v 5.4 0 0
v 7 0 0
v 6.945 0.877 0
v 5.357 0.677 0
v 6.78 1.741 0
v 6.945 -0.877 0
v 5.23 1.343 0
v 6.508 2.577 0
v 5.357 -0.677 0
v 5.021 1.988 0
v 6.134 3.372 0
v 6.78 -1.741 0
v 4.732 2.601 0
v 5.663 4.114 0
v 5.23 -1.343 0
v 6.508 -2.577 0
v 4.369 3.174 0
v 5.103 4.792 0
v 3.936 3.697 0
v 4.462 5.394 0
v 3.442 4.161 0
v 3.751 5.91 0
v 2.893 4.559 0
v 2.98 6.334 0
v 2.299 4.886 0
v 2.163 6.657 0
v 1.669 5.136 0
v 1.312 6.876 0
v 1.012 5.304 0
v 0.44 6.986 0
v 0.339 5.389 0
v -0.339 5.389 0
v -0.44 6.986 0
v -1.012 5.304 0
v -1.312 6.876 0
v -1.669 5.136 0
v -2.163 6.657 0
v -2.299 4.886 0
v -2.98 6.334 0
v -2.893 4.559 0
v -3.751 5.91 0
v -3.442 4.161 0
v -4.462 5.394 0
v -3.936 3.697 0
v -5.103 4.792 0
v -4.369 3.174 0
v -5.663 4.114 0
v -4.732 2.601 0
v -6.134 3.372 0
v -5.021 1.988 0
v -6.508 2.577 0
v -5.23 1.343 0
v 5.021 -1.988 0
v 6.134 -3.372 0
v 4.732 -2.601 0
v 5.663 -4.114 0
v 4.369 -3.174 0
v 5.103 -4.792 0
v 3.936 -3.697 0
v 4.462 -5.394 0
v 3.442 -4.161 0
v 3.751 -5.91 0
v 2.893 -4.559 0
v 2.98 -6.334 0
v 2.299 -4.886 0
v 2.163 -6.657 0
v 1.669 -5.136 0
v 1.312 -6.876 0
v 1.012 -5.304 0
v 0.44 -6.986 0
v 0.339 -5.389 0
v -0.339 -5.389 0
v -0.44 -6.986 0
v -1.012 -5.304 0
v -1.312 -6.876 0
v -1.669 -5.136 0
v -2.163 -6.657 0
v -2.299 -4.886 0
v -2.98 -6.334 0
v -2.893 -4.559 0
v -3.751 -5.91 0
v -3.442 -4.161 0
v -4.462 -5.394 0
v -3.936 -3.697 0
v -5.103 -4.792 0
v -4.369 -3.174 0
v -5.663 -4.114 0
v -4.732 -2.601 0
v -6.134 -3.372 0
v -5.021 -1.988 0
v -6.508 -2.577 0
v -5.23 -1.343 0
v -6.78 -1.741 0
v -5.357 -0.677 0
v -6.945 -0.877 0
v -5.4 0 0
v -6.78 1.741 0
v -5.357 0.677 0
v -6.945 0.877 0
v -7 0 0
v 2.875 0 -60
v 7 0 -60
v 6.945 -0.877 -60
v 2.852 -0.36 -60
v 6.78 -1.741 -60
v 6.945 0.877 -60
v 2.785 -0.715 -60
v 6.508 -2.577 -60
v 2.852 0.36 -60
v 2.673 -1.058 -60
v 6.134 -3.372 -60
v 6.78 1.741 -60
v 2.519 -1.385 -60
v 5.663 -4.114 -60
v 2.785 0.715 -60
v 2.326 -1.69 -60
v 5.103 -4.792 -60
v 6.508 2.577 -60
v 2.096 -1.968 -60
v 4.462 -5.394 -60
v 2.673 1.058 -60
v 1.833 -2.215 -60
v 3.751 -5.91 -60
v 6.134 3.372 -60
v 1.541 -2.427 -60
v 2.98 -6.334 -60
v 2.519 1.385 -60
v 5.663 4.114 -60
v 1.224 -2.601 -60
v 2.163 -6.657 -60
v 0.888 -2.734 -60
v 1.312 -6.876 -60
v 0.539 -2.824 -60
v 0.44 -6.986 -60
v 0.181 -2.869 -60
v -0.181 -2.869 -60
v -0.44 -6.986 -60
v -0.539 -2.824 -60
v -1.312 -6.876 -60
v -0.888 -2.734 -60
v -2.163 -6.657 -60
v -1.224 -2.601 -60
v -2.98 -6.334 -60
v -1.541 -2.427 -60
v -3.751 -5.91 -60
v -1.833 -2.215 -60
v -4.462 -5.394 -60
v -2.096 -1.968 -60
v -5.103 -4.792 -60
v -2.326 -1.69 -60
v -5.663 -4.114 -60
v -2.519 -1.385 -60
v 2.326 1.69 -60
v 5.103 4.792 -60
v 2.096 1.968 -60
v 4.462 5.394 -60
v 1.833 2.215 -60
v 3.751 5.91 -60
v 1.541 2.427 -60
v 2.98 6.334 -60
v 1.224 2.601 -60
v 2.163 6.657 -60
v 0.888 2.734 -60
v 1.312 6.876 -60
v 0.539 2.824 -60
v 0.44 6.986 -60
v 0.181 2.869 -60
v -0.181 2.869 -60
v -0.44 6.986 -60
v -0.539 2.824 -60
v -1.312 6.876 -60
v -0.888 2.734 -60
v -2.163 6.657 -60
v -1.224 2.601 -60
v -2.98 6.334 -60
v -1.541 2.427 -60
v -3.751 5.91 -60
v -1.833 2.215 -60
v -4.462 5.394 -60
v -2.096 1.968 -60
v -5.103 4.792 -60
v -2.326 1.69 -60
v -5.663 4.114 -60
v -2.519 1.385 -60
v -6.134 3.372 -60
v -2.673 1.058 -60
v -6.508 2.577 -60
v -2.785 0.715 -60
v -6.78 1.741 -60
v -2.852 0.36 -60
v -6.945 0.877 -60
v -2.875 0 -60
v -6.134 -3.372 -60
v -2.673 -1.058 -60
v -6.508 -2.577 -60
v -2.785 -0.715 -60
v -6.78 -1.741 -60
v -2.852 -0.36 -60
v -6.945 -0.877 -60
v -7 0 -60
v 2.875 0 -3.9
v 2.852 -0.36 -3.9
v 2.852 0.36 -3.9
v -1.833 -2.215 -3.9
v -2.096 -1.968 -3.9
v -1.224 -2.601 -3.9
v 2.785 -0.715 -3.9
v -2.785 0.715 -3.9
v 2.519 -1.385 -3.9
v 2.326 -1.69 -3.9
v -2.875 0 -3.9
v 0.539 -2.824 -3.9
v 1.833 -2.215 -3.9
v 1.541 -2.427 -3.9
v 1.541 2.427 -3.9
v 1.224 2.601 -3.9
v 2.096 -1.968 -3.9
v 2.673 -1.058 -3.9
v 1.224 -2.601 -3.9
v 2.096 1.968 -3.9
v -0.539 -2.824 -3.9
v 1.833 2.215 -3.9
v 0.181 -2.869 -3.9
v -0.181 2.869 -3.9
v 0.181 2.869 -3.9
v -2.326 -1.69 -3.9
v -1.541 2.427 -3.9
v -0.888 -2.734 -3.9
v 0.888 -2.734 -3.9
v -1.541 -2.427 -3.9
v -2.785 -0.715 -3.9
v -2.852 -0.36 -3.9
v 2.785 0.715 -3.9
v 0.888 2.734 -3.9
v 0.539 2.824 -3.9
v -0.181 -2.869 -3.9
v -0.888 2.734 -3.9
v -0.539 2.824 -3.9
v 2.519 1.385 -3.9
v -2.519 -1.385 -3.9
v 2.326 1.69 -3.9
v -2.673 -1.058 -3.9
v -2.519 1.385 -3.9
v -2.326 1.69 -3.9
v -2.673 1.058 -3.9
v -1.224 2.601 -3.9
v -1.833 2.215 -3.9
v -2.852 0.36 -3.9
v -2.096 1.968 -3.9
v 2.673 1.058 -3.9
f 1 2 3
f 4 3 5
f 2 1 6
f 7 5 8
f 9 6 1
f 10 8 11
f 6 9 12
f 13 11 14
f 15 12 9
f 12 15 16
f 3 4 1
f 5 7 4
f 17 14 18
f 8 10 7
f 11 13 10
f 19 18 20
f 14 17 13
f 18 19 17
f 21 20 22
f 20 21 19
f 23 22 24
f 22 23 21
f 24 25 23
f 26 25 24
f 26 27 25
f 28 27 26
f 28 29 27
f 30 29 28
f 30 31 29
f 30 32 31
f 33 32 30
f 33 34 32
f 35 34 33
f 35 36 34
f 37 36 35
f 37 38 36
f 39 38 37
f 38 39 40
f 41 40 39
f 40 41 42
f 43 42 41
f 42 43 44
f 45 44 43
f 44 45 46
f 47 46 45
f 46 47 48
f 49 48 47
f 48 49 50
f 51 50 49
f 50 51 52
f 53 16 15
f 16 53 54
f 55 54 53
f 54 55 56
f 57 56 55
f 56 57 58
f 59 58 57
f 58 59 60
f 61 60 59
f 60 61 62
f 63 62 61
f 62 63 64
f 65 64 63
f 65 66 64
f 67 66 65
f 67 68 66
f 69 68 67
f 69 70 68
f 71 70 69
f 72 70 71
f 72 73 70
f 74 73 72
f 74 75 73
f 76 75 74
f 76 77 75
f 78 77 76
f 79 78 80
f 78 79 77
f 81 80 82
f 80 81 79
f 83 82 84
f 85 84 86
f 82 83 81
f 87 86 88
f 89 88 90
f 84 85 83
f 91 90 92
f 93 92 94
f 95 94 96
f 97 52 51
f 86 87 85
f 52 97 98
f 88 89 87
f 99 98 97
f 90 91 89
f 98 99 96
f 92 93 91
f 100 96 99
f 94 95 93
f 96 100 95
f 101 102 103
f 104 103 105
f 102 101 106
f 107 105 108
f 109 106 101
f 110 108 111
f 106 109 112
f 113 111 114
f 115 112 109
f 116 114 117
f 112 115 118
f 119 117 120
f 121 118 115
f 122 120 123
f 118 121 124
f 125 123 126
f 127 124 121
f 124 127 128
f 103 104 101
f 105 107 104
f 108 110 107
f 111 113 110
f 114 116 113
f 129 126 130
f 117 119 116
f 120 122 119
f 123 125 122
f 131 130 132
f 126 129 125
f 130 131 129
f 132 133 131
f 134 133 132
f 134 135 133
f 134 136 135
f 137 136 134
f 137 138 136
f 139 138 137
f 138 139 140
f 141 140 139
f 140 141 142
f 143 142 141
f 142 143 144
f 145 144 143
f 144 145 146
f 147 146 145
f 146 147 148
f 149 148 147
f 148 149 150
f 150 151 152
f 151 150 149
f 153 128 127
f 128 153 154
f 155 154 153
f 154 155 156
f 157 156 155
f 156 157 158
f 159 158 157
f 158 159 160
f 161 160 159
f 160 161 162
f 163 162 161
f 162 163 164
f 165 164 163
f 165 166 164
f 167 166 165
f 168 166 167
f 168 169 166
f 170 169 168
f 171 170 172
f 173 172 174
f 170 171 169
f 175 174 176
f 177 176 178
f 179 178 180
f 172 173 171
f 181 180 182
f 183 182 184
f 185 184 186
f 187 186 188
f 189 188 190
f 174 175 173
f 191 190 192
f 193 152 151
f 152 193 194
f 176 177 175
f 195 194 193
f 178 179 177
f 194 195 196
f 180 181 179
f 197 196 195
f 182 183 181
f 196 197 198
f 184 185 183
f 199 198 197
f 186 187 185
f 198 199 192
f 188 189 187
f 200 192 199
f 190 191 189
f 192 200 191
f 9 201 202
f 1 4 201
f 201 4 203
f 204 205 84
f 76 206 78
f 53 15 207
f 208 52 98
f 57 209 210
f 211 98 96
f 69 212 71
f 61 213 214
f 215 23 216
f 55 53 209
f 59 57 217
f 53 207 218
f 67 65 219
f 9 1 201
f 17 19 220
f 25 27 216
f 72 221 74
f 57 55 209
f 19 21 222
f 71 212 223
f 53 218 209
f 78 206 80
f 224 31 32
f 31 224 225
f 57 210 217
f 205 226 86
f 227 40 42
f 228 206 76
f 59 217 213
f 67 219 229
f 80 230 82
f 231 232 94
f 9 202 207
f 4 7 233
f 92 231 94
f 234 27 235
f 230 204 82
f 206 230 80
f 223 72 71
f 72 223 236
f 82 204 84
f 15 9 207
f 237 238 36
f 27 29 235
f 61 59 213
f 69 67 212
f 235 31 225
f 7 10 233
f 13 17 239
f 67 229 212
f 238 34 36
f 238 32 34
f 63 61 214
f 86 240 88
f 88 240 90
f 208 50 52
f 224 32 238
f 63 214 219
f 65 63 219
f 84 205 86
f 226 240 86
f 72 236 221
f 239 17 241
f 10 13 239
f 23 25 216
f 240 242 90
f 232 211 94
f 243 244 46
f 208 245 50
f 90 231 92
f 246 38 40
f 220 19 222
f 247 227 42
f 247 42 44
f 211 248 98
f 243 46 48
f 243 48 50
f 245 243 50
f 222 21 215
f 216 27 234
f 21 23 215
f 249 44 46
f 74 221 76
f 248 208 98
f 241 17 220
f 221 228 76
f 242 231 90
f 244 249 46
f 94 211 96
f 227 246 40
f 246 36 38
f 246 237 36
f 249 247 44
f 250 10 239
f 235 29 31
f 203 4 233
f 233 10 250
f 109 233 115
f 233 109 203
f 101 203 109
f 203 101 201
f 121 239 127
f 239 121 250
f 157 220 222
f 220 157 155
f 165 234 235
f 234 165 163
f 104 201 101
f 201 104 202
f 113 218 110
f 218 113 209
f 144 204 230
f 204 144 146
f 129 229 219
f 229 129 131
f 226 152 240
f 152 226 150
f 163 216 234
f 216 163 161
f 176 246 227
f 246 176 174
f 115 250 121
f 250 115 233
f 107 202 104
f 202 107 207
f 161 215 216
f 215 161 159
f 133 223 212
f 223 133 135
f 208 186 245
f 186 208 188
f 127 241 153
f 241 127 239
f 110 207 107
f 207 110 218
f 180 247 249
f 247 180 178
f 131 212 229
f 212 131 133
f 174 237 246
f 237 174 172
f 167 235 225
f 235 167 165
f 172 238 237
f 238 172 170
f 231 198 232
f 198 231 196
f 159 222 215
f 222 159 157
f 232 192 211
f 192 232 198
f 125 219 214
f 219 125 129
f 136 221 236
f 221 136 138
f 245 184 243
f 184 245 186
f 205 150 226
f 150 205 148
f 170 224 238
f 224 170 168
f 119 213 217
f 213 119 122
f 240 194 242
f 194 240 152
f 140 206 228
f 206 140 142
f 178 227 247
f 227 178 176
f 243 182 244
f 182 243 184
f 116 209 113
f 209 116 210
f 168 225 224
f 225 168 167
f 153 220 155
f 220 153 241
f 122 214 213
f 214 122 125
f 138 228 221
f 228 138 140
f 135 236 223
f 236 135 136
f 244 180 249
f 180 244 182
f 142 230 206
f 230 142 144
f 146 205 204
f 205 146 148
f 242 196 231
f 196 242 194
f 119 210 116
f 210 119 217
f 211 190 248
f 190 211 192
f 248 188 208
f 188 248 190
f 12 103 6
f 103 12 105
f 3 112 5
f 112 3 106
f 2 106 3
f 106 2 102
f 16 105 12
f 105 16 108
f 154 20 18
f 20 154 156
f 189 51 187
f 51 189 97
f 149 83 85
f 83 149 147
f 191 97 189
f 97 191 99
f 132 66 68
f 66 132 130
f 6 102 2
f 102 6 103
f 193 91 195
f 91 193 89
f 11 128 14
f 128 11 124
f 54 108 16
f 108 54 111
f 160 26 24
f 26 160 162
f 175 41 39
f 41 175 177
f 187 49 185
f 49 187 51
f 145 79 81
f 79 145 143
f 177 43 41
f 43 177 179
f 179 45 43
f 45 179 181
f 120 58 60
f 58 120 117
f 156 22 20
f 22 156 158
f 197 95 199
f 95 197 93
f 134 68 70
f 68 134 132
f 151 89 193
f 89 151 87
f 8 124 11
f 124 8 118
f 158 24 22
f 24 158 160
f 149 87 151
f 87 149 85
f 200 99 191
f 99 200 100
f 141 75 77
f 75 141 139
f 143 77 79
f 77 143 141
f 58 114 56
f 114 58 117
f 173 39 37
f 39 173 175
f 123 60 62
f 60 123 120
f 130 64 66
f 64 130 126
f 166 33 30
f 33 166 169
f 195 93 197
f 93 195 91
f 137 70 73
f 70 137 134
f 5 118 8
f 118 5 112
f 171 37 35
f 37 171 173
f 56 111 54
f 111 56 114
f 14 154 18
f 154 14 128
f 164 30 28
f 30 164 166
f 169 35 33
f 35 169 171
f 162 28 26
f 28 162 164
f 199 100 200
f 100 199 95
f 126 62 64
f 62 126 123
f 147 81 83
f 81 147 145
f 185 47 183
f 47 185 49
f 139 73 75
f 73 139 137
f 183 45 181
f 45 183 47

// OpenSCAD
$fn = 50;


difference() {
	union() {
		translate(v = [0, 0, -60.0000000000]) {
			cylinder(h = 60, r = 7.0000000000);
		}
		cylinder(h = 0, r = 16.0000000000);
	}
	union() {
		translate(v = [0, 0, 0]) {
			rotate(a = [0, 0, 0]) {
				difference() {
					union() {
						#translate(v = [0, 0, -60.0000000000]) {
							cylinder(h = 60, r = 2.6000000000);
						}
						#translate(v = [0, 0, -3.9000000000]) {
							cylinder(h = 3.9000000000, r1 = 2.8750000000, r2 = 5.4000000000);
						}
						#translate(v = [0, 0, -60.0000000000]) {
							cylinder(h = 60, r = 2.8750000000);
						}
						#translate(v = [0, 0, -60.0000000000]) {
							cylinder(h = 60, r = 2.6000000000);
						}
					}
					union();
				}
			}
		}
	}
}
